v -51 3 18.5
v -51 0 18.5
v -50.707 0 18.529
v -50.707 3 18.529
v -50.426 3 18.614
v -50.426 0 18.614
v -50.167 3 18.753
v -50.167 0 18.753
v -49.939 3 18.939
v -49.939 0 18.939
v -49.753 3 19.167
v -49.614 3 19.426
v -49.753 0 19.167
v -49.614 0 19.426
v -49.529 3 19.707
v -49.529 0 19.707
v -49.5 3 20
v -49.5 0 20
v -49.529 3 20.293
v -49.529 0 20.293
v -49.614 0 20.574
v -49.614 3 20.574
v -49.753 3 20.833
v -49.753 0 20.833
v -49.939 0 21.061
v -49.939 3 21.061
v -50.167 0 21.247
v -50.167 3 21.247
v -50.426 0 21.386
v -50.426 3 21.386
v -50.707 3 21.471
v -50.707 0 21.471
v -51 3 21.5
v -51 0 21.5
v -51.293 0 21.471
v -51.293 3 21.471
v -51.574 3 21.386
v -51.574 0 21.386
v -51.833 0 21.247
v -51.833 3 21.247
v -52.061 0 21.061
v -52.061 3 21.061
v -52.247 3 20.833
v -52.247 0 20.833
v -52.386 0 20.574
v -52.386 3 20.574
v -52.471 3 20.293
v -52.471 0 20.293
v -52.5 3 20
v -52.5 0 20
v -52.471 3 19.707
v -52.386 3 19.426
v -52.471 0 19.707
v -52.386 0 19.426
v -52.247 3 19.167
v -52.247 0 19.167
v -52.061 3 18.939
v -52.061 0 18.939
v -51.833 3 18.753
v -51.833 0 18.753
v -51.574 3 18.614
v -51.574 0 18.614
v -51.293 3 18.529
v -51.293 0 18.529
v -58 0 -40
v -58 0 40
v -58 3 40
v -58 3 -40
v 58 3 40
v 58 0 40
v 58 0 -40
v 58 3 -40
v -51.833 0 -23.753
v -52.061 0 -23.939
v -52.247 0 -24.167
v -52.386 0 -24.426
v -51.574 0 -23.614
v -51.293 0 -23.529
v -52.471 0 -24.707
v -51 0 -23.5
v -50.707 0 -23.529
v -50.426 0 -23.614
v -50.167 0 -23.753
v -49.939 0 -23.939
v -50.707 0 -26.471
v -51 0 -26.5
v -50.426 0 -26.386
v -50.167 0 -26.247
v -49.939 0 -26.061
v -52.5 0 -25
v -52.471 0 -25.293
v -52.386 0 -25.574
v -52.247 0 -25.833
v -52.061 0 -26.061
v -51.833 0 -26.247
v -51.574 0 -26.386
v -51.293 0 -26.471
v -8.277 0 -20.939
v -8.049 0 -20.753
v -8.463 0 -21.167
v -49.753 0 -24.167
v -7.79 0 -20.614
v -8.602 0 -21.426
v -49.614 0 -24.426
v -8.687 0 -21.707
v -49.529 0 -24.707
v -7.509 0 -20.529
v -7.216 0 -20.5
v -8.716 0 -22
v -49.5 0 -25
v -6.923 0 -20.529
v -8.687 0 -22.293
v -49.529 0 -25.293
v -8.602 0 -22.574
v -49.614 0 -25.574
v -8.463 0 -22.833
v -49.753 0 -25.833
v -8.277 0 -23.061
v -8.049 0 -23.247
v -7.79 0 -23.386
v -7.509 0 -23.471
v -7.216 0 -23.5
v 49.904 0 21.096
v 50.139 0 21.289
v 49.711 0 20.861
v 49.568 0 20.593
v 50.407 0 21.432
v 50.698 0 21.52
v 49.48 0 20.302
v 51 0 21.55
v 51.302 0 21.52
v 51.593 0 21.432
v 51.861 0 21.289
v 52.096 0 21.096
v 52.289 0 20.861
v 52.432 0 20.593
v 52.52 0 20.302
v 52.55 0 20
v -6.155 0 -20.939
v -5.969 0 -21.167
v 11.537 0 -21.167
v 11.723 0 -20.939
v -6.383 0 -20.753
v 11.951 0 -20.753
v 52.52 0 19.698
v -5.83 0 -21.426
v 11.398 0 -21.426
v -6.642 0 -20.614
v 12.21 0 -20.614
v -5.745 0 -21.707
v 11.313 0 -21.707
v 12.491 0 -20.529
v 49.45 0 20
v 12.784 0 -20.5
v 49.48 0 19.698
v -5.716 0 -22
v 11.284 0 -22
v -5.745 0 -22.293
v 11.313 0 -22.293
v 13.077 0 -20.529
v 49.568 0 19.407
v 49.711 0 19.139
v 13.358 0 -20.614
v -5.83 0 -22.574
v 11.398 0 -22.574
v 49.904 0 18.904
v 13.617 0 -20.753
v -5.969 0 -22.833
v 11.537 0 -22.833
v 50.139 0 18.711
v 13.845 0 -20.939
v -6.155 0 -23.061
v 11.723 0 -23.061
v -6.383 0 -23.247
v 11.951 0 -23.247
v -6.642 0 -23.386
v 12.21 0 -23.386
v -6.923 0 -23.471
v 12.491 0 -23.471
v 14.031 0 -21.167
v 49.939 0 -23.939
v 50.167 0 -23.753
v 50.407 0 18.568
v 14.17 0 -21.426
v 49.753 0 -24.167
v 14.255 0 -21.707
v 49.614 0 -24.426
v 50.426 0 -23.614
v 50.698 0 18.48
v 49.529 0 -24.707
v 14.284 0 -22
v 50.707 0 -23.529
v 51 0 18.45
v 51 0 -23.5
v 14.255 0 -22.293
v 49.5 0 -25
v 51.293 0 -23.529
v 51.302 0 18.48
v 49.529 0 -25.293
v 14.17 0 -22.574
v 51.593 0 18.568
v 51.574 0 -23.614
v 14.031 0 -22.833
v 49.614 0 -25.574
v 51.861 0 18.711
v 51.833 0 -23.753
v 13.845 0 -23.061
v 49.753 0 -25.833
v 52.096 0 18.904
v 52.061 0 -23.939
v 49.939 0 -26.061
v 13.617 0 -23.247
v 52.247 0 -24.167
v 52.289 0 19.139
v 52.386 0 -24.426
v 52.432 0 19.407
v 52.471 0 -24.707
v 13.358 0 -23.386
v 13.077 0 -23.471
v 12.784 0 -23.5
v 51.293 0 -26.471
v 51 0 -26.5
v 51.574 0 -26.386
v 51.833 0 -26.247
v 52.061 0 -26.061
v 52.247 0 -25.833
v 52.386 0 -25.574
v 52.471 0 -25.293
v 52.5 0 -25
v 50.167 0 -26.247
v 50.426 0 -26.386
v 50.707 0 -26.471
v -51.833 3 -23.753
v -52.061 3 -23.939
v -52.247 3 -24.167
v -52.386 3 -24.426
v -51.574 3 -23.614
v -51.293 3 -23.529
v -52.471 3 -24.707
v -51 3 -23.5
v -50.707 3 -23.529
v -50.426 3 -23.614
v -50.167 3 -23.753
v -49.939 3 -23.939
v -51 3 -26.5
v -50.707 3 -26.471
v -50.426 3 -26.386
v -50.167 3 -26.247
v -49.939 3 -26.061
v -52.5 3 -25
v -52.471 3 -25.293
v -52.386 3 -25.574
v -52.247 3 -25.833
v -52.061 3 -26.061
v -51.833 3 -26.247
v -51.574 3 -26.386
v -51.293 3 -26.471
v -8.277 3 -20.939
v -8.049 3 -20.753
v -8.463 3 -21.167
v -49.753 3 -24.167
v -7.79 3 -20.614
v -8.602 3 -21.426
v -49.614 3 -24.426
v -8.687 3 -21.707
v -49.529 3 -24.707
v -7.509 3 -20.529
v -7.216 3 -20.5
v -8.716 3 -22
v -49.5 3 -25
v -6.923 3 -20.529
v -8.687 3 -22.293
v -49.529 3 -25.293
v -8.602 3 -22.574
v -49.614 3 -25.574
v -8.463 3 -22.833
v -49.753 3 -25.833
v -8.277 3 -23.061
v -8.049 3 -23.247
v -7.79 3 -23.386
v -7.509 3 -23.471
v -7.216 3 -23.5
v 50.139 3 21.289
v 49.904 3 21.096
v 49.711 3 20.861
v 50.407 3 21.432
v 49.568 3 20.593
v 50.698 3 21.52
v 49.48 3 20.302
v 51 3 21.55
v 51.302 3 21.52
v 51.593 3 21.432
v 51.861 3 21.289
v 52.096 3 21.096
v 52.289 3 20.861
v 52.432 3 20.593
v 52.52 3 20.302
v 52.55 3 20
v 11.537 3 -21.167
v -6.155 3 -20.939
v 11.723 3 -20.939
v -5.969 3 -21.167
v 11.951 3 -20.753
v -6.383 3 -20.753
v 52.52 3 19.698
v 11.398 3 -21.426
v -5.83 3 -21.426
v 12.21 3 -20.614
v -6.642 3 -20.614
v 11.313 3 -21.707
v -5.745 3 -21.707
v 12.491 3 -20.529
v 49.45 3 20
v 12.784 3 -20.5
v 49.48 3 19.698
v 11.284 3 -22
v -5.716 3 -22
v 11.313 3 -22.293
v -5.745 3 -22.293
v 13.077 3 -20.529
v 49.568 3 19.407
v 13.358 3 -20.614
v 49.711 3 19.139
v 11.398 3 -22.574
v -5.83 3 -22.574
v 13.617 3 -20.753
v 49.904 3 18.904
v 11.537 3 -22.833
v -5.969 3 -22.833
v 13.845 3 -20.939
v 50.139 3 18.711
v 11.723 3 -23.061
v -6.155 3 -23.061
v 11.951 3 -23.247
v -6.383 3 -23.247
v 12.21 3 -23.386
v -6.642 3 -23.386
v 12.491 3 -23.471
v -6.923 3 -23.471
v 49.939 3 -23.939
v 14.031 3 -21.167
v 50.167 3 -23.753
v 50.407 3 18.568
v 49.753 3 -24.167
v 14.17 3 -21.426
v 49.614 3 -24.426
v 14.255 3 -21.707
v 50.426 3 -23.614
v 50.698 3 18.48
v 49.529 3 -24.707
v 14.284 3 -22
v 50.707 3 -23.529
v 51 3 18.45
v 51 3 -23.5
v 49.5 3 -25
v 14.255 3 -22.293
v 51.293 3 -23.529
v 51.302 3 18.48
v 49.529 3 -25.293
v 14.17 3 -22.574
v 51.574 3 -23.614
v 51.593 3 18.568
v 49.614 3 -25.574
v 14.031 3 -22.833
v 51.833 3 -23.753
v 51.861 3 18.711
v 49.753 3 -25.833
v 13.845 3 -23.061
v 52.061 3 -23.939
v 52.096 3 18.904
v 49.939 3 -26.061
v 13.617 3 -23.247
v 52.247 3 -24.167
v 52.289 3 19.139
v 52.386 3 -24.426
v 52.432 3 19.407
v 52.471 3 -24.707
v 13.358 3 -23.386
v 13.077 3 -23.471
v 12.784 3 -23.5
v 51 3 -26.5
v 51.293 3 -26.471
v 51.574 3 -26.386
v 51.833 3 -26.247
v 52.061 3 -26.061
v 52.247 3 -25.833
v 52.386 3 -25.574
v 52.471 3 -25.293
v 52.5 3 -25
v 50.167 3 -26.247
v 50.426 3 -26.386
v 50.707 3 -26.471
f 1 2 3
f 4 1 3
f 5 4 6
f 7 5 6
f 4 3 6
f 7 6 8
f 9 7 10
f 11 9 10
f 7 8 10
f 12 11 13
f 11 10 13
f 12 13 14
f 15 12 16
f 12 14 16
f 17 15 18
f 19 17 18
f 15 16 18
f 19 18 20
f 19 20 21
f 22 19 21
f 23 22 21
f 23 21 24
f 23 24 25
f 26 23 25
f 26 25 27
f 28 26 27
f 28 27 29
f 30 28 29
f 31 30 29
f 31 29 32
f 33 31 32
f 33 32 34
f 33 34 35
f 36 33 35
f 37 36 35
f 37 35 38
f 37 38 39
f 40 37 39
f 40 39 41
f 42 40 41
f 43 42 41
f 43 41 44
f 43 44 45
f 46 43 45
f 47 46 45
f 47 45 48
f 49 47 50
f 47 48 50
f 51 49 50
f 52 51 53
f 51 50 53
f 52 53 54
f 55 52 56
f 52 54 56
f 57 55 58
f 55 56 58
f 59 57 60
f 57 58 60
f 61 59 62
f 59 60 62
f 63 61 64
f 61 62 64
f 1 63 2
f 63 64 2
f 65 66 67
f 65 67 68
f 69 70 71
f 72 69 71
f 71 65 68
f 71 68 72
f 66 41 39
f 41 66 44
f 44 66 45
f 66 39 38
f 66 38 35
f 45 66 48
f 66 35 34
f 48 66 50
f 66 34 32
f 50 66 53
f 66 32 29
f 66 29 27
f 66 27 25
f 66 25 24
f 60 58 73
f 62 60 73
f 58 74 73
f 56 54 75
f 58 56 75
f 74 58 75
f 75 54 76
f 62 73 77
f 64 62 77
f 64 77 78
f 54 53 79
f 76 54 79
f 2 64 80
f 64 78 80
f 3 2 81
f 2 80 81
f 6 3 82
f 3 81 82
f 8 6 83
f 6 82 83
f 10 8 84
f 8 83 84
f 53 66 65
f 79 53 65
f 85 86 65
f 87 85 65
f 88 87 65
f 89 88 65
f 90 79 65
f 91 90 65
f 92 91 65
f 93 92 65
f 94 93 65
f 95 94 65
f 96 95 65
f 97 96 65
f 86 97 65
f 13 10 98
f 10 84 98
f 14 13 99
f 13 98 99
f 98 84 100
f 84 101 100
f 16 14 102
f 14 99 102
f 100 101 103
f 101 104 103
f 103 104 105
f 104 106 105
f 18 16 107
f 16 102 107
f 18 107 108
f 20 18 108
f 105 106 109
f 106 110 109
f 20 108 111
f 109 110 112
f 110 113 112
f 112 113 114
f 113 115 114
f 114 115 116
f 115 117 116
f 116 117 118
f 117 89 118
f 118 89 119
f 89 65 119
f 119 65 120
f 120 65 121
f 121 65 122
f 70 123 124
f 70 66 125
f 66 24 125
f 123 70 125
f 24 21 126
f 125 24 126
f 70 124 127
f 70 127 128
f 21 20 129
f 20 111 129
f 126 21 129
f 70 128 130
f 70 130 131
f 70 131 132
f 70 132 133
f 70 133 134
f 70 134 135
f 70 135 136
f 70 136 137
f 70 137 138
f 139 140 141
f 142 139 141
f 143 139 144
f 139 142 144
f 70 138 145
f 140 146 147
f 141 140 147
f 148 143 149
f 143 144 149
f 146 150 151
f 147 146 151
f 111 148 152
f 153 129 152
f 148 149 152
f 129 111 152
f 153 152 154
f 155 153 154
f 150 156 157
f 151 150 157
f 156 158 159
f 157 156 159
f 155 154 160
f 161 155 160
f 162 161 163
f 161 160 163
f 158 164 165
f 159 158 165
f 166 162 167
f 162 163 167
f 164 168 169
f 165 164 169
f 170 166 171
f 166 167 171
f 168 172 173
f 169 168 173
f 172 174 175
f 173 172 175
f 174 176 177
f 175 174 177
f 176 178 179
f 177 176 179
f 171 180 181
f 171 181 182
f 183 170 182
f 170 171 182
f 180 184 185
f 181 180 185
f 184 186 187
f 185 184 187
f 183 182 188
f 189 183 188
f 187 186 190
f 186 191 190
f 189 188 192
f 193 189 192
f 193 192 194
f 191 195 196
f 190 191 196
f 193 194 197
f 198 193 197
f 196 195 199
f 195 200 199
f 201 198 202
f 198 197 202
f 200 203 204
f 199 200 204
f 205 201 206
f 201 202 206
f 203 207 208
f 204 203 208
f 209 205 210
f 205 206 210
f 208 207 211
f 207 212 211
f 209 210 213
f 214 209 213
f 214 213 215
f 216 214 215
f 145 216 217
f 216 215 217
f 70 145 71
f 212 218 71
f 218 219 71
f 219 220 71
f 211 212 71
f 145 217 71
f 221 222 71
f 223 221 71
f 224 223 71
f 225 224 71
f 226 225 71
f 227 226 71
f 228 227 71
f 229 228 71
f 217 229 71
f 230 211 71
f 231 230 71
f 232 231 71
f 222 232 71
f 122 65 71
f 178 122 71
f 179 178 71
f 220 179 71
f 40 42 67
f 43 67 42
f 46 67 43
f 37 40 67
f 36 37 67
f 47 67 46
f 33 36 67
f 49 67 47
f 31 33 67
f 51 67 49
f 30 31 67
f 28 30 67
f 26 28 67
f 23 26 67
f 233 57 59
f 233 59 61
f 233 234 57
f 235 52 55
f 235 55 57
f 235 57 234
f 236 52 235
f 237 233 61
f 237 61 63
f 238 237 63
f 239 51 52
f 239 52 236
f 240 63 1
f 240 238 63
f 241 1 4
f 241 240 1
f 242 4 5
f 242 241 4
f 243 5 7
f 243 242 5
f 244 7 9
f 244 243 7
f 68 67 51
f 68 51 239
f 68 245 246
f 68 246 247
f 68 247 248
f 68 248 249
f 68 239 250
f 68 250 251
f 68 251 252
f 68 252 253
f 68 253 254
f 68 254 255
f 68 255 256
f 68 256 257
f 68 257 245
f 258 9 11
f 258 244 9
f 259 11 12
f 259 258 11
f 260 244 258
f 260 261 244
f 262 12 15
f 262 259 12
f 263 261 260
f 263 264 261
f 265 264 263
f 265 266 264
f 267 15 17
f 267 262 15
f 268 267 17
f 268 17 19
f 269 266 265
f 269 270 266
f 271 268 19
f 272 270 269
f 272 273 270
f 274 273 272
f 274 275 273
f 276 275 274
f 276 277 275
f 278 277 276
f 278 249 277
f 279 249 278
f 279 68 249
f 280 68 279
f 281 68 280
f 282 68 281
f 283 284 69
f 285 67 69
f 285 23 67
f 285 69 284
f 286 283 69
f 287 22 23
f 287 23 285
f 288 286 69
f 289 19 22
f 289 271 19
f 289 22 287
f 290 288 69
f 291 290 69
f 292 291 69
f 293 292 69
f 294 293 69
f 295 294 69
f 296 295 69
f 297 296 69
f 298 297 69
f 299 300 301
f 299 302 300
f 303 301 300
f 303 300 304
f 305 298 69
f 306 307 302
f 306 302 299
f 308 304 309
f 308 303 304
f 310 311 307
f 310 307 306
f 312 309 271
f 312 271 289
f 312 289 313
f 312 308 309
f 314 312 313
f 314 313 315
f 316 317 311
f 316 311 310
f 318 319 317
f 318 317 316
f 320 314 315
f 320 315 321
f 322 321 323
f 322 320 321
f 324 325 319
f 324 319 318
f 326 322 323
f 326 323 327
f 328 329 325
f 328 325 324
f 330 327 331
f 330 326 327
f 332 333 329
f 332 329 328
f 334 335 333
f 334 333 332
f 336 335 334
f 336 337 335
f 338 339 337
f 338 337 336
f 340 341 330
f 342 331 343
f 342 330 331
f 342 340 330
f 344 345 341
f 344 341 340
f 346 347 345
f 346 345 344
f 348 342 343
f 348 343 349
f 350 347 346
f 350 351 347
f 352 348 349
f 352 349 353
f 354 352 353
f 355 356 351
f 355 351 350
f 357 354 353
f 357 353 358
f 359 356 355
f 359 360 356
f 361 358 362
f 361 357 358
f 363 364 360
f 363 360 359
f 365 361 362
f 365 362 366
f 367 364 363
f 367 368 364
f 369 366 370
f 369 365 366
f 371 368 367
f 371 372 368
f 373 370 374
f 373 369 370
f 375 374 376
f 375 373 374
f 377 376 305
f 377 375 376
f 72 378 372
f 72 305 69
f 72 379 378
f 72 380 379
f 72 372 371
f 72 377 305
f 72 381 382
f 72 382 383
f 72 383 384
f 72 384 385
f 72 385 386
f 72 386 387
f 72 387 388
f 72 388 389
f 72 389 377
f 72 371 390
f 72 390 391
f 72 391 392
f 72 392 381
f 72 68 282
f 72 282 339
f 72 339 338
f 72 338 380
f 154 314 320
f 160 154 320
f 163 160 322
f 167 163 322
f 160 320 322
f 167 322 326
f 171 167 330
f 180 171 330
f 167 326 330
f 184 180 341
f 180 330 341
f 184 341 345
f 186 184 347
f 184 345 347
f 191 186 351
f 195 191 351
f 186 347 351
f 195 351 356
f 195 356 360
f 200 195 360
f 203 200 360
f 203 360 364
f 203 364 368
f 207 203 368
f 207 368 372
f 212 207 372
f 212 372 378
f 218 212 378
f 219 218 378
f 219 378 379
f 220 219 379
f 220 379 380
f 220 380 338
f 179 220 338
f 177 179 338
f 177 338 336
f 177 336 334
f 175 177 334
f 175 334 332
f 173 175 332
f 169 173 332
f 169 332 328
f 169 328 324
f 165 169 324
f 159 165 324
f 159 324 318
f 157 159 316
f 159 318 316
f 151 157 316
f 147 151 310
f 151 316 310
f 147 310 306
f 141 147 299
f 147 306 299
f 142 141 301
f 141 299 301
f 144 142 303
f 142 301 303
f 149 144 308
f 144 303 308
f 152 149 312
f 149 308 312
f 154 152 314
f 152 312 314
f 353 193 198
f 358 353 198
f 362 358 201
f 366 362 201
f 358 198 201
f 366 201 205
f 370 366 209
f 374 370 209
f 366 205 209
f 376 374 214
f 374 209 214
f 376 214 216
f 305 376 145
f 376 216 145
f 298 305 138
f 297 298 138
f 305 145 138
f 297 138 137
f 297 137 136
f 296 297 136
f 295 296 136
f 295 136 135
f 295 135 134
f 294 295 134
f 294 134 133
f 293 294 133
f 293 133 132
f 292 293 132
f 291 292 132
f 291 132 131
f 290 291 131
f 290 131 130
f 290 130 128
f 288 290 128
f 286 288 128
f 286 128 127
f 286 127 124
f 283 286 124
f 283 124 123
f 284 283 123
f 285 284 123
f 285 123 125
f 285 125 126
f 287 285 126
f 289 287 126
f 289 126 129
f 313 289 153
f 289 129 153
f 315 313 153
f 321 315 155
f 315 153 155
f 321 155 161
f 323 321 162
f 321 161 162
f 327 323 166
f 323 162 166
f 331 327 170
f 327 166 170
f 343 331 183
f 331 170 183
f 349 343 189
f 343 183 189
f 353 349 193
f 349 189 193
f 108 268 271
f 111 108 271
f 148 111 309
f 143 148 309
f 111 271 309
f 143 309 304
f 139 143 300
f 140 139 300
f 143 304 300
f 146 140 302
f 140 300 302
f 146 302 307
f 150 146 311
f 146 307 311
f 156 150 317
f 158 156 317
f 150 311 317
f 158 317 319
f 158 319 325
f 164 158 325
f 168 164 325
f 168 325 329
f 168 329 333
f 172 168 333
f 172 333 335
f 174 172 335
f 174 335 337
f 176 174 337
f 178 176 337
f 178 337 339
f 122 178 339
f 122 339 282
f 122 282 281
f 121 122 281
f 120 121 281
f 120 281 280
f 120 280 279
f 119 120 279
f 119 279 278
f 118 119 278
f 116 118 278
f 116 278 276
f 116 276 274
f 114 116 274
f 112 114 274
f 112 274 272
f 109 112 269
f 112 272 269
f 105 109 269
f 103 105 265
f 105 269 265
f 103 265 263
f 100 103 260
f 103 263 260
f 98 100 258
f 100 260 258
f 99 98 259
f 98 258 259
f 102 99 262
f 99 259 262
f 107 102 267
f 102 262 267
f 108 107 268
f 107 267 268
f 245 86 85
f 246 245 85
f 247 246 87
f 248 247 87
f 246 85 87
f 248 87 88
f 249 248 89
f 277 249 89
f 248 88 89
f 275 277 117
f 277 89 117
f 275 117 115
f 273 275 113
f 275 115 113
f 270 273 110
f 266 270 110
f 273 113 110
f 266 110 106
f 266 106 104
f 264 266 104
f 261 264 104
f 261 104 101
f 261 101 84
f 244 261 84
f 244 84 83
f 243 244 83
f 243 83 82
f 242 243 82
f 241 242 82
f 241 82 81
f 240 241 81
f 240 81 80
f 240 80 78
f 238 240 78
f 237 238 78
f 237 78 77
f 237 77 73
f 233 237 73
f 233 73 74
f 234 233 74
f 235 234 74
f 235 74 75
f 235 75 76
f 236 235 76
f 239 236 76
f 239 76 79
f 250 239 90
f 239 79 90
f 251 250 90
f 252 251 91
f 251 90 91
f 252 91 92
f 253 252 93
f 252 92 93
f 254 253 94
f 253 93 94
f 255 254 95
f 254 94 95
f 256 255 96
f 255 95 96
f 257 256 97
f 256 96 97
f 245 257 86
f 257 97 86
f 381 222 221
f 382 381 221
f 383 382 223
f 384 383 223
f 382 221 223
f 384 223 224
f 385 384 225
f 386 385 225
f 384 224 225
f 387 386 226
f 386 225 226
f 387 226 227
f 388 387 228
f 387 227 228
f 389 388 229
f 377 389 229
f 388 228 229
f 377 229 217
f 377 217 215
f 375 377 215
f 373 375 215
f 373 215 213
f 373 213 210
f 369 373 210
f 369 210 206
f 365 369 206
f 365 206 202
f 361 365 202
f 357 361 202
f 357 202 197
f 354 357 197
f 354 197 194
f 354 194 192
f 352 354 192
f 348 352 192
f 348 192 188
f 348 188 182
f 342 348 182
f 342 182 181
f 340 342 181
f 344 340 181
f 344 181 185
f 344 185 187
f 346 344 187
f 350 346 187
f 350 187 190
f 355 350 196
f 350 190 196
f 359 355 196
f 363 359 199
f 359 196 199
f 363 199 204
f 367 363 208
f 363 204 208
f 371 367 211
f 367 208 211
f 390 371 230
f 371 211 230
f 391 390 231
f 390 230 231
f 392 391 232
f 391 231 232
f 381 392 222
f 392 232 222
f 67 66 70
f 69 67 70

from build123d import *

# Parameters (mm, degrees)
SKETCH_1_W          = 116
SKETCH_1_H          = 80
EXTRUDE_1_DEPTH     = 3
SKETCH_2_R          = 1.5
SKETCH_2_R_2        = 1.55
CUT_EXTRUDE_1_DEPTH = 10
SKETCH_3_R          = 1.5
CUT_EXTRUDE_2_DEPTH = 71.519500849


with BuildPart() as part:
    # 草图1 → 凸台-拉伸1 (new body)
    with BuildSketch(Plane(origin=(0, 0, 0), x_dir=(1, 0, 0), z_dir=(0, 1, 0))):
        Rectangle(SKETCH_1_W, SKETCH_1_H)
    extrude(amount=EXTRUDE_1_DEPTH)

    # 草图2 → 切除-拉伸1 (cut)
    with BuildSketch(Plane.XZ):
        with Locations(Location((-51, 20, 0), (0, 0, 270))):
            Circle(SKETCH_2_R)
        with Locations(Location((51, 20, 0), (0, 0, 270))):
            Circle(SKETCH_2_R_2)
        with Locations(Location((51, -25, 0), (0, 0, 270))):
            Circle(SKETCH_2_R)
        with Locations(Location((-51, -25, 0), (0, 0, 270))):
            Circle(SKETCH_2_R)
    extrude(amount=-CUT_EXTRUDE_1_DEPTH, mode=Mode.SUBTRACT)

    # 草图3 → 切除-拉伸2 (cut, through all)
    with BuildSketch(Plane(origin=(0, 3, 0), x_dir=(1, 0, 0), z_dir=(0, 1, 0))):
        with Locations(Location((-7.215969028, 22, 0), (0, 0, 270))):
            Circle(SKETCH_3_R)
        with Locations(Location((12.784030972, 22, 0), (0, 0, 270))):
            Circle(SKETCH_3_R)
    extrude(amount=-CUT_EXTRUDE_2_DEPTH, mode=Mode.SUBTRACT)


solid = part.part
